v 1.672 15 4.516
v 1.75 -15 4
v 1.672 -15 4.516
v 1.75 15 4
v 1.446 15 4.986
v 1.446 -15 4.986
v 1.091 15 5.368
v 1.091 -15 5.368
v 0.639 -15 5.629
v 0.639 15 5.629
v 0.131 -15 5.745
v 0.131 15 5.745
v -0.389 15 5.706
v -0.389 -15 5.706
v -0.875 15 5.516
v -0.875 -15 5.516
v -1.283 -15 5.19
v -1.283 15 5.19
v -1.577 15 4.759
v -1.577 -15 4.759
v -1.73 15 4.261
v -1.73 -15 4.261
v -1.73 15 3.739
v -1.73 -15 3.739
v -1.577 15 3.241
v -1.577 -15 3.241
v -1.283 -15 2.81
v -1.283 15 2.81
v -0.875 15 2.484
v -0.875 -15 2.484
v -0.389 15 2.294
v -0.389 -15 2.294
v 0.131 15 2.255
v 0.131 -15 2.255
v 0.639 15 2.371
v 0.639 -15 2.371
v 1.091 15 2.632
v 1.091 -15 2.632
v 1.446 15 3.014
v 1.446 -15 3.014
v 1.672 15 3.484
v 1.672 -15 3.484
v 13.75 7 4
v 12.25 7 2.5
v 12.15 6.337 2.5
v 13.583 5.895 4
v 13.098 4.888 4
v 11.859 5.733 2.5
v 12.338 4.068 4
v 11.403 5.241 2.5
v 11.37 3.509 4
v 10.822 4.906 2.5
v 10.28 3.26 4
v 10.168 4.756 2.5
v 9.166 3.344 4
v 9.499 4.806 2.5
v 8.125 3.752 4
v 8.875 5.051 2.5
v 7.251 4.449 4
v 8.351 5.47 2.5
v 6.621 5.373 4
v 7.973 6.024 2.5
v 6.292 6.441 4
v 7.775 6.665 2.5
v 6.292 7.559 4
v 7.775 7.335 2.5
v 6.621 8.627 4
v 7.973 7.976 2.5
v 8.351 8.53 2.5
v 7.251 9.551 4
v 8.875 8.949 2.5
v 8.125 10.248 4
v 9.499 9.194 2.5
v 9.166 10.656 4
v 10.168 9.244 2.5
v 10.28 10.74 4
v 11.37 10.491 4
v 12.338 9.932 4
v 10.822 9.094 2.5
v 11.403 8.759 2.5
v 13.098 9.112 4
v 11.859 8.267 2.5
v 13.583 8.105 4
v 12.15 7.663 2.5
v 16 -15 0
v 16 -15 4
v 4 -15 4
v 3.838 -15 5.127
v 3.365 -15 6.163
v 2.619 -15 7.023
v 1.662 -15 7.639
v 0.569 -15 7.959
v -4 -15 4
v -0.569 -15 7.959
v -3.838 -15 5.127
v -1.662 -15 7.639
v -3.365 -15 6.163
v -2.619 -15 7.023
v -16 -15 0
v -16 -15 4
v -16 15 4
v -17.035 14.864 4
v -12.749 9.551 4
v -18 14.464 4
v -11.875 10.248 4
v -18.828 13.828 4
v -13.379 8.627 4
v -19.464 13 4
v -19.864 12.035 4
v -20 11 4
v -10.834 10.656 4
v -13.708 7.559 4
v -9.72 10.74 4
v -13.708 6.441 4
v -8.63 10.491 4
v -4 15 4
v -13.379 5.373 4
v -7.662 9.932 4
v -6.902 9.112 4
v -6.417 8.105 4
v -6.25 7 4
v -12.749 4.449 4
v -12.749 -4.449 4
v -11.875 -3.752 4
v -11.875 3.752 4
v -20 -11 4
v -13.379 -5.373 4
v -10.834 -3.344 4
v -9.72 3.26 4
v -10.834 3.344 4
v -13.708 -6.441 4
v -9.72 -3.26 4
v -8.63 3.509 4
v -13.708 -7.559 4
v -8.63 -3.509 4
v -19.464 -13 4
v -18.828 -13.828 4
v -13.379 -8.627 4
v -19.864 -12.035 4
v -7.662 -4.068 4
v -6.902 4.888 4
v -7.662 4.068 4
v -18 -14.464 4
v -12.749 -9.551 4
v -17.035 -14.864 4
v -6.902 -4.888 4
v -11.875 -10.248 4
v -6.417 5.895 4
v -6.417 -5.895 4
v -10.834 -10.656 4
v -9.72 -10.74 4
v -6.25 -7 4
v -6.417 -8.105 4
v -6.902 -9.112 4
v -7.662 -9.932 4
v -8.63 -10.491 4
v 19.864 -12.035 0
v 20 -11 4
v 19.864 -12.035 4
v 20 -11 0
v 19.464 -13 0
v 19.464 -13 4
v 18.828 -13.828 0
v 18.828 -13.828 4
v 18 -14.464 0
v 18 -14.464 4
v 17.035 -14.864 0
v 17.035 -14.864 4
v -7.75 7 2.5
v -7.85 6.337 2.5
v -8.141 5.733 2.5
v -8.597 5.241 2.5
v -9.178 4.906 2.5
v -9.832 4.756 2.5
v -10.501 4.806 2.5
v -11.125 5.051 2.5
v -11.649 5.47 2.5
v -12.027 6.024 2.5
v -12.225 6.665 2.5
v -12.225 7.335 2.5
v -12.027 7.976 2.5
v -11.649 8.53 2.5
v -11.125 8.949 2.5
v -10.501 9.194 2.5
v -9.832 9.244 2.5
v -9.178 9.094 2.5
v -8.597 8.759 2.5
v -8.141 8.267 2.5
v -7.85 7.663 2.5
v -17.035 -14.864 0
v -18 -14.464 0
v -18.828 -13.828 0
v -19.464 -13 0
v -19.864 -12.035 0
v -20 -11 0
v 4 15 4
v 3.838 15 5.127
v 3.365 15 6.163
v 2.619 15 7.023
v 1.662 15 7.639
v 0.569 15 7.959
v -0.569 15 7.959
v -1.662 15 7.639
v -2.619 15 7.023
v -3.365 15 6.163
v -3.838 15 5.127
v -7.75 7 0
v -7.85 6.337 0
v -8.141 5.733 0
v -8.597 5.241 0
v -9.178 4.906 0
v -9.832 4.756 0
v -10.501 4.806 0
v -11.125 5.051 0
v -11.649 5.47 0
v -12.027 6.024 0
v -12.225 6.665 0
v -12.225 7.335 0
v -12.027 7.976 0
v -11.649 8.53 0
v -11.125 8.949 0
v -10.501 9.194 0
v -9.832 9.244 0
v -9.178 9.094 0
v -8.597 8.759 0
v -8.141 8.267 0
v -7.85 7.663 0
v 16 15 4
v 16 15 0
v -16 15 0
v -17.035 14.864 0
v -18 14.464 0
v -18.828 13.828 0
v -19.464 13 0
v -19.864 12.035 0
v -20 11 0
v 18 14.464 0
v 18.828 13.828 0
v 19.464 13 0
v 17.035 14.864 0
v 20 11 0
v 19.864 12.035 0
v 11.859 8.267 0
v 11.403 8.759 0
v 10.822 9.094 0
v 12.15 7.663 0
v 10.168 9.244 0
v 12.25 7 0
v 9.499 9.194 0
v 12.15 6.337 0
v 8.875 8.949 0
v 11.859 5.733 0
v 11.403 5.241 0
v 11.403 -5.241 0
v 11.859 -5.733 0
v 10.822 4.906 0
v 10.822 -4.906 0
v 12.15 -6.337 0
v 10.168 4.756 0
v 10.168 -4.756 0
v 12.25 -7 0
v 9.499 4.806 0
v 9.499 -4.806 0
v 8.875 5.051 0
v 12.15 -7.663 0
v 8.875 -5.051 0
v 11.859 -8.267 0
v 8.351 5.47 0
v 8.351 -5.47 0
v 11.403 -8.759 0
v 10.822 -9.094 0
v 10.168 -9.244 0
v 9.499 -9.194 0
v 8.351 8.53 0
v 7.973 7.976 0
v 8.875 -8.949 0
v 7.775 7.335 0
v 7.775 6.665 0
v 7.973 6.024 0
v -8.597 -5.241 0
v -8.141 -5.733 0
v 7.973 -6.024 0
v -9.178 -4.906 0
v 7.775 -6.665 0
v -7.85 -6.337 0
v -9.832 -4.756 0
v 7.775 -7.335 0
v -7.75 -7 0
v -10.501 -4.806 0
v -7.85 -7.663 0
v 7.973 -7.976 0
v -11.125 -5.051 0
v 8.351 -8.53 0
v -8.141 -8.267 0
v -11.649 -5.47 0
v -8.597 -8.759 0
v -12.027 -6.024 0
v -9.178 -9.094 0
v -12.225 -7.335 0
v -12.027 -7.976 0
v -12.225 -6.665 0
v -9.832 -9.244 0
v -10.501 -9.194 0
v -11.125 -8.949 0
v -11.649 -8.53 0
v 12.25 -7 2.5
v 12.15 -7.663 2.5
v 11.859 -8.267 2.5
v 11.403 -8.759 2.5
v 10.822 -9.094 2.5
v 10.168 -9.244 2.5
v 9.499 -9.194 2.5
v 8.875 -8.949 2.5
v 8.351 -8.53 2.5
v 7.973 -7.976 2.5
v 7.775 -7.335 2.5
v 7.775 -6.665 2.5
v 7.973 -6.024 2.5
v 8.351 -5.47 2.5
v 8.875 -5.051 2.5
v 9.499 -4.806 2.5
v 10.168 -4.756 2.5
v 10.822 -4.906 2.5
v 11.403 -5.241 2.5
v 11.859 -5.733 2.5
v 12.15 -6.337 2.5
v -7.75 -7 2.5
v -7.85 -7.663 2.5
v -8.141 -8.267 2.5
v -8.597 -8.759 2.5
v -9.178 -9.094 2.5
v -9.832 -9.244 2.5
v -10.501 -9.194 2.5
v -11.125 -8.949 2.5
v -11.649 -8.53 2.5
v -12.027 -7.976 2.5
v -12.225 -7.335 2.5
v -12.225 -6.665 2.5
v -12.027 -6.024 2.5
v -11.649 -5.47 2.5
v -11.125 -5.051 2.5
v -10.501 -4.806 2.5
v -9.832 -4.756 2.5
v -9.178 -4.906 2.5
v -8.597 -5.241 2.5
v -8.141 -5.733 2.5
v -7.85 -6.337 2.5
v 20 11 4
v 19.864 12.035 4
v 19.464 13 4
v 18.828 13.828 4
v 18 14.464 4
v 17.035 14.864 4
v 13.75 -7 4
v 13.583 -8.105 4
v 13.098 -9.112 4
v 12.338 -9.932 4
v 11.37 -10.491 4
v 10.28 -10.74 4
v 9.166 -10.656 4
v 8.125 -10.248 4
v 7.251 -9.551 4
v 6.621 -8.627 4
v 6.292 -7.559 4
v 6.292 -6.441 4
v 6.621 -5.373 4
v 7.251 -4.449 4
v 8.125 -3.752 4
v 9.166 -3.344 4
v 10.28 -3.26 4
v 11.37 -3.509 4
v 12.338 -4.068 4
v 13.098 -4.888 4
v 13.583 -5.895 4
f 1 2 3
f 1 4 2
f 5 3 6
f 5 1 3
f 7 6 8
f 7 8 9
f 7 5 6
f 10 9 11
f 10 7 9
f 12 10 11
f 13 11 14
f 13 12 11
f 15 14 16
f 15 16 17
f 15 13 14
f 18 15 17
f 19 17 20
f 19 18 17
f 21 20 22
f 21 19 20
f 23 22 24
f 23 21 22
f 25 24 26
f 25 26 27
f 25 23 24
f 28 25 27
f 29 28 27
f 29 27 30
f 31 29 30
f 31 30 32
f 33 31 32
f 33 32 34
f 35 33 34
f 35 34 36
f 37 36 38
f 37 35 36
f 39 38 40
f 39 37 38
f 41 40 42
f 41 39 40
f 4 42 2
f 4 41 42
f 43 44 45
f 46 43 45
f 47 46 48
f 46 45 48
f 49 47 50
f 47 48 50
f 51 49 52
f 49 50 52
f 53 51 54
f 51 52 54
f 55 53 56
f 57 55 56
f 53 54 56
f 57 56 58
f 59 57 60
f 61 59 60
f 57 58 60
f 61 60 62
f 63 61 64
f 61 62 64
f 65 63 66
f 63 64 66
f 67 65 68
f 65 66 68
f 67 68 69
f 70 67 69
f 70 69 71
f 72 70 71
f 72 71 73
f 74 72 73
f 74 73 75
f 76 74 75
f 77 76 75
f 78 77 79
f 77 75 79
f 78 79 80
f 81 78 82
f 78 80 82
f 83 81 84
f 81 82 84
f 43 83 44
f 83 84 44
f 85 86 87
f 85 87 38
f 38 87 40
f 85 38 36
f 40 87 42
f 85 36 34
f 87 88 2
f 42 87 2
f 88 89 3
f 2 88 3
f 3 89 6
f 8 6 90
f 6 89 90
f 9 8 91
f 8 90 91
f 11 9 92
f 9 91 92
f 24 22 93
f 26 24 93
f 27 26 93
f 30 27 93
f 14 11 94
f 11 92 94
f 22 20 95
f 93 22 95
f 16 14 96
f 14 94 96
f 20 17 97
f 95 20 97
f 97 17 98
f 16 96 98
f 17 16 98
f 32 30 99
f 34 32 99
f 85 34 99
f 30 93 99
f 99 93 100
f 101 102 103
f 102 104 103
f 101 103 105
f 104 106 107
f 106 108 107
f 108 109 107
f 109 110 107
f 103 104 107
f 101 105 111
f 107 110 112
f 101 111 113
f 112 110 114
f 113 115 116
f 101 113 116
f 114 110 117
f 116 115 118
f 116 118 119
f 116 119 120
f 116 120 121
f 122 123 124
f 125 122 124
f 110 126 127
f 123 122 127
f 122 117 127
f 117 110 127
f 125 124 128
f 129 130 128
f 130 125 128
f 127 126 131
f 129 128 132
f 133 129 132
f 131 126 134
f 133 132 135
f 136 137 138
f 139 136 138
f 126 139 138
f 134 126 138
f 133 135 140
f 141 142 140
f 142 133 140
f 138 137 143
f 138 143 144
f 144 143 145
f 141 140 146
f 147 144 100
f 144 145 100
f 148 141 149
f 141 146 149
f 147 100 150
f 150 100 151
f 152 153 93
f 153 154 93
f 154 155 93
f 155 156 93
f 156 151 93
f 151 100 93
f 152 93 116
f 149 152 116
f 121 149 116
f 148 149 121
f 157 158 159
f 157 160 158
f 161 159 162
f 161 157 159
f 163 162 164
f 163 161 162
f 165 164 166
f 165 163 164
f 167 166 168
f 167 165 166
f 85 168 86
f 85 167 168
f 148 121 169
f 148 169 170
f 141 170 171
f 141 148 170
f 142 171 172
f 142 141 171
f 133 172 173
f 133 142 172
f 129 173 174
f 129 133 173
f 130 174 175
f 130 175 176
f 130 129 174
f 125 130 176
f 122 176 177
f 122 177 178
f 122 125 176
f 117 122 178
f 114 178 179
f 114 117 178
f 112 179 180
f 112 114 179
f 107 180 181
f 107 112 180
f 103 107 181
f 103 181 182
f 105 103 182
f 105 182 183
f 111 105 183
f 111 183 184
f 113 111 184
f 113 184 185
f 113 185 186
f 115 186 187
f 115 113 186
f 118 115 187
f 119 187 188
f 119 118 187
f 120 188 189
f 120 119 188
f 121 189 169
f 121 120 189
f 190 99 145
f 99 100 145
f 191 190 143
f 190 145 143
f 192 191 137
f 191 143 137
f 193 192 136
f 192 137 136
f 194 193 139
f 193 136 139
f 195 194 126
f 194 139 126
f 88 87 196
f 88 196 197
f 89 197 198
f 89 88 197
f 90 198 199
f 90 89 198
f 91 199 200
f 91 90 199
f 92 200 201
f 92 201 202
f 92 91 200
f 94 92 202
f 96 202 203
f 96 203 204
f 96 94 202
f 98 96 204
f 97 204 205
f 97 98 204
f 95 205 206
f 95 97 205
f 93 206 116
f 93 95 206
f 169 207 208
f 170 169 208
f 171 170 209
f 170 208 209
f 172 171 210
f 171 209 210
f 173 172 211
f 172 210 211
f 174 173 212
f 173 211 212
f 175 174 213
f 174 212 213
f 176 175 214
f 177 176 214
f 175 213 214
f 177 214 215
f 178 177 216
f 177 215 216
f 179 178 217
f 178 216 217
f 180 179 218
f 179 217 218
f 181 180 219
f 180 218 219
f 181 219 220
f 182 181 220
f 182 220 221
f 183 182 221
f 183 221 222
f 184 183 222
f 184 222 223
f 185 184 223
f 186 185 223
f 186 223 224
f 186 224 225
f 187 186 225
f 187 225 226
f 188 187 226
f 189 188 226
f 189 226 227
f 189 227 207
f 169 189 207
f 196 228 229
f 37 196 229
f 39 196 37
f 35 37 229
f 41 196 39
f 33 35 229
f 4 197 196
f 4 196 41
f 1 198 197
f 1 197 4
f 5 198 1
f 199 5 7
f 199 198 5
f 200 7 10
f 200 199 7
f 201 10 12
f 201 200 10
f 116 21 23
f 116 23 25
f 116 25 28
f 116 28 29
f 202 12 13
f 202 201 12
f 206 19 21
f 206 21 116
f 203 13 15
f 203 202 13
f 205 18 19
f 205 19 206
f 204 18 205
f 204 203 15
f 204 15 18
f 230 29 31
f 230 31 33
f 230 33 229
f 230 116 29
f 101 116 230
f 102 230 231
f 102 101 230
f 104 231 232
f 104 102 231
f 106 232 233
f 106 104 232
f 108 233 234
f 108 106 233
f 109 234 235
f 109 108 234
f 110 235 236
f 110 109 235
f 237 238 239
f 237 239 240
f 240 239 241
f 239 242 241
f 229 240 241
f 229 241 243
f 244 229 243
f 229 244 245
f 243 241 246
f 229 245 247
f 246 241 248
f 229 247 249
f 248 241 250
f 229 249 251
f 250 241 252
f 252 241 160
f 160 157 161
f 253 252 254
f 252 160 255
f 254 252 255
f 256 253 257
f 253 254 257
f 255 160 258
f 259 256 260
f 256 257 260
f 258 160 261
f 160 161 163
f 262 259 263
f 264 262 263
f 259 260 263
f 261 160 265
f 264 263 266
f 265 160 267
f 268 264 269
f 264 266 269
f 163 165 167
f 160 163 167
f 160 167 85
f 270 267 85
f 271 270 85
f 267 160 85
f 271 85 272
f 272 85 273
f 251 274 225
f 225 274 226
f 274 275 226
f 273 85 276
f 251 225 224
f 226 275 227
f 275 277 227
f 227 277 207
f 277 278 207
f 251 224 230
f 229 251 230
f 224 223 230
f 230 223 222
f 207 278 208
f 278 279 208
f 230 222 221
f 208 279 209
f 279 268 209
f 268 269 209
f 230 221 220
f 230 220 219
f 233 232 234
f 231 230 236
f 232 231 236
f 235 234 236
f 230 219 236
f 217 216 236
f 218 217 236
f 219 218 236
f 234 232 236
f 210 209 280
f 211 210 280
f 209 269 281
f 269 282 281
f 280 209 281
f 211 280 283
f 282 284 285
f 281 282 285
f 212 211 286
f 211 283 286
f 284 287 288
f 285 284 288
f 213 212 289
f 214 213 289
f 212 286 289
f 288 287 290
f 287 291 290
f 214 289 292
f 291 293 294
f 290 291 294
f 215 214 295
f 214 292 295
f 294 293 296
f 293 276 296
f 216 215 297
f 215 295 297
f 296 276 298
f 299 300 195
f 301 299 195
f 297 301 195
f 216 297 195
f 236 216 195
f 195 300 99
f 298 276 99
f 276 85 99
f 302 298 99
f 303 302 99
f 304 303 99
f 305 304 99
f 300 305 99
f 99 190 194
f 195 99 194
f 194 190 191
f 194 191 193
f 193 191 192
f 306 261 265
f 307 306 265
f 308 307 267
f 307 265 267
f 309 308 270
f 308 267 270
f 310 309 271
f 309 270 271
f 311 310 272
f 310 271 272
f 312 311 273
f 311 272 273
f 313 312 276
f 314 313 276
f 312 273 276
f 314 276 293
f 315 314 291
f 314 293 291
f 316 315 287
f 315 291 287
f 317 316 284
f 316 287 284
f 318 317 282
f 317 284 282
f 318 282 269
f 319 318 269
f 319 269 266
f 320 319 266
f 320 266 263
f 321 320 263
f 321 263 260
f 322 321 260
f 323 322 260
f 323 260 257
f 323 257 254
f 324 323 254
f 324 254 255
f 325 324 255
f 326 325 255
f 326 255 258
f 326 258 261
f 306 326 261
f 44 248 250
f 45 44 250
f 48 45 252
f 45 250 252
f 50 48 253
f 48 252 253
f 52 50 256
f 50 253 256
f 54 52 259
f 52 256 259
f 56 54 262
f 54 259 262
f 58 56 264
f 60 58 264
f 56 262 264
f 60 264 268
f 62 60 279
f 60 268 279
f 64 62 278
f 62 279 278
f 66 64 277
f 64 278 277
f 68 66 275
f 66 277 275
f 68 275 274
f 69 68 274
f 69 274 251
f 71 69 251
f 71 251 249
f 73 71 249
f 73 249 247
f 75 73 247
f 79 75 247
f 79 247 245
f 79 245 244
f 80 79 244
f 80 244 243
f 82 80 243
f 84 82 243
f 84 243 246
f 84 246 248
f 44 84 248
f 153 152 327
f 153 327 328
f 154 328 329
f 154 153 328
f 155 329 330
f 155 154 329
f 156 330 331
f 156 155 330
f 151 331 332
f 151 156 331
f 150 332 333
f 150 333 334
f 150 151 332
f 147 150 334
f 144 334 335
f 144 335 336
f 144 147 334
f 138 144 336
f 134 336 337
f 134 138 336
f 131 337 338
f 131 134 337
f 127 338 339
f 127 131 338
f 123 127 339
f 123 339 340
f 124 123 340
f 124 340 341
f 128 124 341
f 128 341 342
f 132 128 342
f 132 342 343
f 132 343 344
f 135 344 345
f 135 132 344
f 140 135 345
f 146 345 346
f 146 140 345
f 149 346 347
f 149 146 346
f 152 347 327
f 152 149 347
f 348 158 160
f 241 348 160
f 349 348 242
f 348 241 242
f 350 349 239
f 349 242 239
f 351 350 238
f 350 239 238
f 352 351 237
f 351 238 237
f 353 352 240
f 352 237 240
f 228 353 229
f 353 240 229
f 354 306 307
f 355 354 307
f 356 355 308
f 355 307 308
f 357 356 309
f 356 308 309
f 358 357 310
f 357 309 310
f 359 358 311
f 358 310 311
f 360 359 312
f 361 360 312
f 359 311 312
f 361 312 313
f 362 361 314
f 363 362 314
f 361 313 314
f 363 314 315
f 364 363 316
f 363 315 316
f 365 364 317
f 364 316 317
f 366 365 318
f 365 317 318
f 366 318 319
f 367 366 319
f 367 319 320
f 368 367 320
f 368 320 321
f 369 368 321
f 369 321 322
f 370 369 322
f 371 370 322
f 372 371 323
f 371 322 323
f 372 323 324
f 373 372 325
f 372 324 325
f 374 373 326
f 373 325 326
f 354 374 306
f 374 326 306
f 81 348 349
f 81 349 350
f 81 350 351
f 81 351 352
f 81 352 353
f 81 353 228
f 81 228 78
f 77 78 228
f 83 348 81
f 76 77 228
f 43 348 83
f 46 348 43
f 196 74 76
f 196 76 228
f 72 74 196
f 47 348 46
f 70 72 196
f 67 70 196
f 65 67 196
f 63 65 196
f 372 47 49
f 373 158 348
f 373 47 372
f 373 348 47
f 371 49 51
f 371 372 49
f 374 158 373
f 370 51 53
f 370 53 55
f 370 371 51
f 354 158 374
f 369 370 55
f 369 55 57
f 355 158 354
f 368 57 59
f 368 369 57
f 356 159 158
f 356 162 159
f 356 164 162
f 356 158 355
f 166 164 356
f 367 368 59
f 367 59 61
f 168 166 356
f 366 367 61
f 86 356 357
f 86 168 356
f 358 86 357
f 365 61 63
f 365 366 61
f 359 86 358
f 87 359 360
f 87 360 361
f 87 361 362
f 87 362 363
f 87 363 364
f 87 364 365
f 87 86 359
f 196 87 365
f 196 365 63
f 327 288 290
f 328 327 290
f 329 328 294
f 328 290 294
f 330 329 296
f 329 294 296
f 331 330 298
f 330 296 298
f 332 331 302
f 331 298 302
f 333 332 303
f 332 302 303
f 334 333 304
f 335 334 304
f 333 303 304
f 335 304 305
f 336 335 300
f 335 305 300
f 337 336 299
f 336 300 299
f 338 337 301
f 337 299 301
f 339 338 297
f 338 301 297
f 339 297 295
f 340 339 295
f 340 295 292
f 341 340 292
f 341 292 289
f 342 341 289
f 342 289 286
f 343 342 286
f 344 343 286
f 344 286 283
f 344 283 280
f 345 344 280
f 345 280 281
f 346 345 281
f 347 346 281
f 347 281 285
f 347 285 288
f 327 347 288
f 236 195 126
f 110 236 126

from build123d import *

# Parameters (mm, degrees)
SKETCH_R     = 1.75
PAD_DEPTH    = 15
SKETCH001_R  = 2.25
POCKET_DEPTH = 8.001
FILLET_R     = 4
CHAMFER_SIZE = 1.5


with BuildPart() as part:
    # Sketch → Pad (new body, symmetric)
    with BuildSketch(Plane.XZ):
        with BuildLine():
            Line((20, 4), (20, 0))
            Line((20, 0), (-20, 0))
            Line((-20, 0), (-20, 4))
            Line((-20, 4), (-4, 4))
            ThreePointArc((4, 4), (0, 8), (-4, 4))
            Line((20, 4), (4, 4))
        make_face()
        with Locations((0, 4)):
            Circle(SKETCH_R, mode=Mode.SUBTRACT)
    extrude(amount=PAD_DEPTH, both=True)

    # Sketch001 (on Face2 of Pad) → Pocket (cut, through all)
    with BuildSketch(Plane(origin=(0, 0, 0), x_dir=(1, 0, 0), z_dir=(0, 0, -1))):
        with Locations((10, 7)):
            Circle(SKETCH001_R)
        with Locations((10, -7)):
            Circle(SKETCH001_R)
        with Locations((-10, 7)):
            Circle(SKETCH001_R)
        with Locations((-10, -7)):
            Circle(SKETCH001_R)
    extrude(amount=-POCKET_DEPTH, mode=Mode.SUBTRACT)

    # Fillet
    fillet_edges = [part.edges().sort_by_distance(p)[0] for p in [
        (20, -15, 2),
        (20, 15, 2),
        (-20, 15, 2),
        (-20, -15, 2),
    ]]
    fillet(fillet_edges, radius=FILLET_R)

    # Chamfer
    chamfer_edges = [part.edges().sort_by_distance(p)[0] for p in [
        (-12.25, -7, 4),
        (-12.25, 7, 4),
        (7.75, 7, 4),
        (7.75, -7, 4),
    ]]
    chamfer(chamfer_edges, length=CHAMFER_SIZE)


solid = part.part
